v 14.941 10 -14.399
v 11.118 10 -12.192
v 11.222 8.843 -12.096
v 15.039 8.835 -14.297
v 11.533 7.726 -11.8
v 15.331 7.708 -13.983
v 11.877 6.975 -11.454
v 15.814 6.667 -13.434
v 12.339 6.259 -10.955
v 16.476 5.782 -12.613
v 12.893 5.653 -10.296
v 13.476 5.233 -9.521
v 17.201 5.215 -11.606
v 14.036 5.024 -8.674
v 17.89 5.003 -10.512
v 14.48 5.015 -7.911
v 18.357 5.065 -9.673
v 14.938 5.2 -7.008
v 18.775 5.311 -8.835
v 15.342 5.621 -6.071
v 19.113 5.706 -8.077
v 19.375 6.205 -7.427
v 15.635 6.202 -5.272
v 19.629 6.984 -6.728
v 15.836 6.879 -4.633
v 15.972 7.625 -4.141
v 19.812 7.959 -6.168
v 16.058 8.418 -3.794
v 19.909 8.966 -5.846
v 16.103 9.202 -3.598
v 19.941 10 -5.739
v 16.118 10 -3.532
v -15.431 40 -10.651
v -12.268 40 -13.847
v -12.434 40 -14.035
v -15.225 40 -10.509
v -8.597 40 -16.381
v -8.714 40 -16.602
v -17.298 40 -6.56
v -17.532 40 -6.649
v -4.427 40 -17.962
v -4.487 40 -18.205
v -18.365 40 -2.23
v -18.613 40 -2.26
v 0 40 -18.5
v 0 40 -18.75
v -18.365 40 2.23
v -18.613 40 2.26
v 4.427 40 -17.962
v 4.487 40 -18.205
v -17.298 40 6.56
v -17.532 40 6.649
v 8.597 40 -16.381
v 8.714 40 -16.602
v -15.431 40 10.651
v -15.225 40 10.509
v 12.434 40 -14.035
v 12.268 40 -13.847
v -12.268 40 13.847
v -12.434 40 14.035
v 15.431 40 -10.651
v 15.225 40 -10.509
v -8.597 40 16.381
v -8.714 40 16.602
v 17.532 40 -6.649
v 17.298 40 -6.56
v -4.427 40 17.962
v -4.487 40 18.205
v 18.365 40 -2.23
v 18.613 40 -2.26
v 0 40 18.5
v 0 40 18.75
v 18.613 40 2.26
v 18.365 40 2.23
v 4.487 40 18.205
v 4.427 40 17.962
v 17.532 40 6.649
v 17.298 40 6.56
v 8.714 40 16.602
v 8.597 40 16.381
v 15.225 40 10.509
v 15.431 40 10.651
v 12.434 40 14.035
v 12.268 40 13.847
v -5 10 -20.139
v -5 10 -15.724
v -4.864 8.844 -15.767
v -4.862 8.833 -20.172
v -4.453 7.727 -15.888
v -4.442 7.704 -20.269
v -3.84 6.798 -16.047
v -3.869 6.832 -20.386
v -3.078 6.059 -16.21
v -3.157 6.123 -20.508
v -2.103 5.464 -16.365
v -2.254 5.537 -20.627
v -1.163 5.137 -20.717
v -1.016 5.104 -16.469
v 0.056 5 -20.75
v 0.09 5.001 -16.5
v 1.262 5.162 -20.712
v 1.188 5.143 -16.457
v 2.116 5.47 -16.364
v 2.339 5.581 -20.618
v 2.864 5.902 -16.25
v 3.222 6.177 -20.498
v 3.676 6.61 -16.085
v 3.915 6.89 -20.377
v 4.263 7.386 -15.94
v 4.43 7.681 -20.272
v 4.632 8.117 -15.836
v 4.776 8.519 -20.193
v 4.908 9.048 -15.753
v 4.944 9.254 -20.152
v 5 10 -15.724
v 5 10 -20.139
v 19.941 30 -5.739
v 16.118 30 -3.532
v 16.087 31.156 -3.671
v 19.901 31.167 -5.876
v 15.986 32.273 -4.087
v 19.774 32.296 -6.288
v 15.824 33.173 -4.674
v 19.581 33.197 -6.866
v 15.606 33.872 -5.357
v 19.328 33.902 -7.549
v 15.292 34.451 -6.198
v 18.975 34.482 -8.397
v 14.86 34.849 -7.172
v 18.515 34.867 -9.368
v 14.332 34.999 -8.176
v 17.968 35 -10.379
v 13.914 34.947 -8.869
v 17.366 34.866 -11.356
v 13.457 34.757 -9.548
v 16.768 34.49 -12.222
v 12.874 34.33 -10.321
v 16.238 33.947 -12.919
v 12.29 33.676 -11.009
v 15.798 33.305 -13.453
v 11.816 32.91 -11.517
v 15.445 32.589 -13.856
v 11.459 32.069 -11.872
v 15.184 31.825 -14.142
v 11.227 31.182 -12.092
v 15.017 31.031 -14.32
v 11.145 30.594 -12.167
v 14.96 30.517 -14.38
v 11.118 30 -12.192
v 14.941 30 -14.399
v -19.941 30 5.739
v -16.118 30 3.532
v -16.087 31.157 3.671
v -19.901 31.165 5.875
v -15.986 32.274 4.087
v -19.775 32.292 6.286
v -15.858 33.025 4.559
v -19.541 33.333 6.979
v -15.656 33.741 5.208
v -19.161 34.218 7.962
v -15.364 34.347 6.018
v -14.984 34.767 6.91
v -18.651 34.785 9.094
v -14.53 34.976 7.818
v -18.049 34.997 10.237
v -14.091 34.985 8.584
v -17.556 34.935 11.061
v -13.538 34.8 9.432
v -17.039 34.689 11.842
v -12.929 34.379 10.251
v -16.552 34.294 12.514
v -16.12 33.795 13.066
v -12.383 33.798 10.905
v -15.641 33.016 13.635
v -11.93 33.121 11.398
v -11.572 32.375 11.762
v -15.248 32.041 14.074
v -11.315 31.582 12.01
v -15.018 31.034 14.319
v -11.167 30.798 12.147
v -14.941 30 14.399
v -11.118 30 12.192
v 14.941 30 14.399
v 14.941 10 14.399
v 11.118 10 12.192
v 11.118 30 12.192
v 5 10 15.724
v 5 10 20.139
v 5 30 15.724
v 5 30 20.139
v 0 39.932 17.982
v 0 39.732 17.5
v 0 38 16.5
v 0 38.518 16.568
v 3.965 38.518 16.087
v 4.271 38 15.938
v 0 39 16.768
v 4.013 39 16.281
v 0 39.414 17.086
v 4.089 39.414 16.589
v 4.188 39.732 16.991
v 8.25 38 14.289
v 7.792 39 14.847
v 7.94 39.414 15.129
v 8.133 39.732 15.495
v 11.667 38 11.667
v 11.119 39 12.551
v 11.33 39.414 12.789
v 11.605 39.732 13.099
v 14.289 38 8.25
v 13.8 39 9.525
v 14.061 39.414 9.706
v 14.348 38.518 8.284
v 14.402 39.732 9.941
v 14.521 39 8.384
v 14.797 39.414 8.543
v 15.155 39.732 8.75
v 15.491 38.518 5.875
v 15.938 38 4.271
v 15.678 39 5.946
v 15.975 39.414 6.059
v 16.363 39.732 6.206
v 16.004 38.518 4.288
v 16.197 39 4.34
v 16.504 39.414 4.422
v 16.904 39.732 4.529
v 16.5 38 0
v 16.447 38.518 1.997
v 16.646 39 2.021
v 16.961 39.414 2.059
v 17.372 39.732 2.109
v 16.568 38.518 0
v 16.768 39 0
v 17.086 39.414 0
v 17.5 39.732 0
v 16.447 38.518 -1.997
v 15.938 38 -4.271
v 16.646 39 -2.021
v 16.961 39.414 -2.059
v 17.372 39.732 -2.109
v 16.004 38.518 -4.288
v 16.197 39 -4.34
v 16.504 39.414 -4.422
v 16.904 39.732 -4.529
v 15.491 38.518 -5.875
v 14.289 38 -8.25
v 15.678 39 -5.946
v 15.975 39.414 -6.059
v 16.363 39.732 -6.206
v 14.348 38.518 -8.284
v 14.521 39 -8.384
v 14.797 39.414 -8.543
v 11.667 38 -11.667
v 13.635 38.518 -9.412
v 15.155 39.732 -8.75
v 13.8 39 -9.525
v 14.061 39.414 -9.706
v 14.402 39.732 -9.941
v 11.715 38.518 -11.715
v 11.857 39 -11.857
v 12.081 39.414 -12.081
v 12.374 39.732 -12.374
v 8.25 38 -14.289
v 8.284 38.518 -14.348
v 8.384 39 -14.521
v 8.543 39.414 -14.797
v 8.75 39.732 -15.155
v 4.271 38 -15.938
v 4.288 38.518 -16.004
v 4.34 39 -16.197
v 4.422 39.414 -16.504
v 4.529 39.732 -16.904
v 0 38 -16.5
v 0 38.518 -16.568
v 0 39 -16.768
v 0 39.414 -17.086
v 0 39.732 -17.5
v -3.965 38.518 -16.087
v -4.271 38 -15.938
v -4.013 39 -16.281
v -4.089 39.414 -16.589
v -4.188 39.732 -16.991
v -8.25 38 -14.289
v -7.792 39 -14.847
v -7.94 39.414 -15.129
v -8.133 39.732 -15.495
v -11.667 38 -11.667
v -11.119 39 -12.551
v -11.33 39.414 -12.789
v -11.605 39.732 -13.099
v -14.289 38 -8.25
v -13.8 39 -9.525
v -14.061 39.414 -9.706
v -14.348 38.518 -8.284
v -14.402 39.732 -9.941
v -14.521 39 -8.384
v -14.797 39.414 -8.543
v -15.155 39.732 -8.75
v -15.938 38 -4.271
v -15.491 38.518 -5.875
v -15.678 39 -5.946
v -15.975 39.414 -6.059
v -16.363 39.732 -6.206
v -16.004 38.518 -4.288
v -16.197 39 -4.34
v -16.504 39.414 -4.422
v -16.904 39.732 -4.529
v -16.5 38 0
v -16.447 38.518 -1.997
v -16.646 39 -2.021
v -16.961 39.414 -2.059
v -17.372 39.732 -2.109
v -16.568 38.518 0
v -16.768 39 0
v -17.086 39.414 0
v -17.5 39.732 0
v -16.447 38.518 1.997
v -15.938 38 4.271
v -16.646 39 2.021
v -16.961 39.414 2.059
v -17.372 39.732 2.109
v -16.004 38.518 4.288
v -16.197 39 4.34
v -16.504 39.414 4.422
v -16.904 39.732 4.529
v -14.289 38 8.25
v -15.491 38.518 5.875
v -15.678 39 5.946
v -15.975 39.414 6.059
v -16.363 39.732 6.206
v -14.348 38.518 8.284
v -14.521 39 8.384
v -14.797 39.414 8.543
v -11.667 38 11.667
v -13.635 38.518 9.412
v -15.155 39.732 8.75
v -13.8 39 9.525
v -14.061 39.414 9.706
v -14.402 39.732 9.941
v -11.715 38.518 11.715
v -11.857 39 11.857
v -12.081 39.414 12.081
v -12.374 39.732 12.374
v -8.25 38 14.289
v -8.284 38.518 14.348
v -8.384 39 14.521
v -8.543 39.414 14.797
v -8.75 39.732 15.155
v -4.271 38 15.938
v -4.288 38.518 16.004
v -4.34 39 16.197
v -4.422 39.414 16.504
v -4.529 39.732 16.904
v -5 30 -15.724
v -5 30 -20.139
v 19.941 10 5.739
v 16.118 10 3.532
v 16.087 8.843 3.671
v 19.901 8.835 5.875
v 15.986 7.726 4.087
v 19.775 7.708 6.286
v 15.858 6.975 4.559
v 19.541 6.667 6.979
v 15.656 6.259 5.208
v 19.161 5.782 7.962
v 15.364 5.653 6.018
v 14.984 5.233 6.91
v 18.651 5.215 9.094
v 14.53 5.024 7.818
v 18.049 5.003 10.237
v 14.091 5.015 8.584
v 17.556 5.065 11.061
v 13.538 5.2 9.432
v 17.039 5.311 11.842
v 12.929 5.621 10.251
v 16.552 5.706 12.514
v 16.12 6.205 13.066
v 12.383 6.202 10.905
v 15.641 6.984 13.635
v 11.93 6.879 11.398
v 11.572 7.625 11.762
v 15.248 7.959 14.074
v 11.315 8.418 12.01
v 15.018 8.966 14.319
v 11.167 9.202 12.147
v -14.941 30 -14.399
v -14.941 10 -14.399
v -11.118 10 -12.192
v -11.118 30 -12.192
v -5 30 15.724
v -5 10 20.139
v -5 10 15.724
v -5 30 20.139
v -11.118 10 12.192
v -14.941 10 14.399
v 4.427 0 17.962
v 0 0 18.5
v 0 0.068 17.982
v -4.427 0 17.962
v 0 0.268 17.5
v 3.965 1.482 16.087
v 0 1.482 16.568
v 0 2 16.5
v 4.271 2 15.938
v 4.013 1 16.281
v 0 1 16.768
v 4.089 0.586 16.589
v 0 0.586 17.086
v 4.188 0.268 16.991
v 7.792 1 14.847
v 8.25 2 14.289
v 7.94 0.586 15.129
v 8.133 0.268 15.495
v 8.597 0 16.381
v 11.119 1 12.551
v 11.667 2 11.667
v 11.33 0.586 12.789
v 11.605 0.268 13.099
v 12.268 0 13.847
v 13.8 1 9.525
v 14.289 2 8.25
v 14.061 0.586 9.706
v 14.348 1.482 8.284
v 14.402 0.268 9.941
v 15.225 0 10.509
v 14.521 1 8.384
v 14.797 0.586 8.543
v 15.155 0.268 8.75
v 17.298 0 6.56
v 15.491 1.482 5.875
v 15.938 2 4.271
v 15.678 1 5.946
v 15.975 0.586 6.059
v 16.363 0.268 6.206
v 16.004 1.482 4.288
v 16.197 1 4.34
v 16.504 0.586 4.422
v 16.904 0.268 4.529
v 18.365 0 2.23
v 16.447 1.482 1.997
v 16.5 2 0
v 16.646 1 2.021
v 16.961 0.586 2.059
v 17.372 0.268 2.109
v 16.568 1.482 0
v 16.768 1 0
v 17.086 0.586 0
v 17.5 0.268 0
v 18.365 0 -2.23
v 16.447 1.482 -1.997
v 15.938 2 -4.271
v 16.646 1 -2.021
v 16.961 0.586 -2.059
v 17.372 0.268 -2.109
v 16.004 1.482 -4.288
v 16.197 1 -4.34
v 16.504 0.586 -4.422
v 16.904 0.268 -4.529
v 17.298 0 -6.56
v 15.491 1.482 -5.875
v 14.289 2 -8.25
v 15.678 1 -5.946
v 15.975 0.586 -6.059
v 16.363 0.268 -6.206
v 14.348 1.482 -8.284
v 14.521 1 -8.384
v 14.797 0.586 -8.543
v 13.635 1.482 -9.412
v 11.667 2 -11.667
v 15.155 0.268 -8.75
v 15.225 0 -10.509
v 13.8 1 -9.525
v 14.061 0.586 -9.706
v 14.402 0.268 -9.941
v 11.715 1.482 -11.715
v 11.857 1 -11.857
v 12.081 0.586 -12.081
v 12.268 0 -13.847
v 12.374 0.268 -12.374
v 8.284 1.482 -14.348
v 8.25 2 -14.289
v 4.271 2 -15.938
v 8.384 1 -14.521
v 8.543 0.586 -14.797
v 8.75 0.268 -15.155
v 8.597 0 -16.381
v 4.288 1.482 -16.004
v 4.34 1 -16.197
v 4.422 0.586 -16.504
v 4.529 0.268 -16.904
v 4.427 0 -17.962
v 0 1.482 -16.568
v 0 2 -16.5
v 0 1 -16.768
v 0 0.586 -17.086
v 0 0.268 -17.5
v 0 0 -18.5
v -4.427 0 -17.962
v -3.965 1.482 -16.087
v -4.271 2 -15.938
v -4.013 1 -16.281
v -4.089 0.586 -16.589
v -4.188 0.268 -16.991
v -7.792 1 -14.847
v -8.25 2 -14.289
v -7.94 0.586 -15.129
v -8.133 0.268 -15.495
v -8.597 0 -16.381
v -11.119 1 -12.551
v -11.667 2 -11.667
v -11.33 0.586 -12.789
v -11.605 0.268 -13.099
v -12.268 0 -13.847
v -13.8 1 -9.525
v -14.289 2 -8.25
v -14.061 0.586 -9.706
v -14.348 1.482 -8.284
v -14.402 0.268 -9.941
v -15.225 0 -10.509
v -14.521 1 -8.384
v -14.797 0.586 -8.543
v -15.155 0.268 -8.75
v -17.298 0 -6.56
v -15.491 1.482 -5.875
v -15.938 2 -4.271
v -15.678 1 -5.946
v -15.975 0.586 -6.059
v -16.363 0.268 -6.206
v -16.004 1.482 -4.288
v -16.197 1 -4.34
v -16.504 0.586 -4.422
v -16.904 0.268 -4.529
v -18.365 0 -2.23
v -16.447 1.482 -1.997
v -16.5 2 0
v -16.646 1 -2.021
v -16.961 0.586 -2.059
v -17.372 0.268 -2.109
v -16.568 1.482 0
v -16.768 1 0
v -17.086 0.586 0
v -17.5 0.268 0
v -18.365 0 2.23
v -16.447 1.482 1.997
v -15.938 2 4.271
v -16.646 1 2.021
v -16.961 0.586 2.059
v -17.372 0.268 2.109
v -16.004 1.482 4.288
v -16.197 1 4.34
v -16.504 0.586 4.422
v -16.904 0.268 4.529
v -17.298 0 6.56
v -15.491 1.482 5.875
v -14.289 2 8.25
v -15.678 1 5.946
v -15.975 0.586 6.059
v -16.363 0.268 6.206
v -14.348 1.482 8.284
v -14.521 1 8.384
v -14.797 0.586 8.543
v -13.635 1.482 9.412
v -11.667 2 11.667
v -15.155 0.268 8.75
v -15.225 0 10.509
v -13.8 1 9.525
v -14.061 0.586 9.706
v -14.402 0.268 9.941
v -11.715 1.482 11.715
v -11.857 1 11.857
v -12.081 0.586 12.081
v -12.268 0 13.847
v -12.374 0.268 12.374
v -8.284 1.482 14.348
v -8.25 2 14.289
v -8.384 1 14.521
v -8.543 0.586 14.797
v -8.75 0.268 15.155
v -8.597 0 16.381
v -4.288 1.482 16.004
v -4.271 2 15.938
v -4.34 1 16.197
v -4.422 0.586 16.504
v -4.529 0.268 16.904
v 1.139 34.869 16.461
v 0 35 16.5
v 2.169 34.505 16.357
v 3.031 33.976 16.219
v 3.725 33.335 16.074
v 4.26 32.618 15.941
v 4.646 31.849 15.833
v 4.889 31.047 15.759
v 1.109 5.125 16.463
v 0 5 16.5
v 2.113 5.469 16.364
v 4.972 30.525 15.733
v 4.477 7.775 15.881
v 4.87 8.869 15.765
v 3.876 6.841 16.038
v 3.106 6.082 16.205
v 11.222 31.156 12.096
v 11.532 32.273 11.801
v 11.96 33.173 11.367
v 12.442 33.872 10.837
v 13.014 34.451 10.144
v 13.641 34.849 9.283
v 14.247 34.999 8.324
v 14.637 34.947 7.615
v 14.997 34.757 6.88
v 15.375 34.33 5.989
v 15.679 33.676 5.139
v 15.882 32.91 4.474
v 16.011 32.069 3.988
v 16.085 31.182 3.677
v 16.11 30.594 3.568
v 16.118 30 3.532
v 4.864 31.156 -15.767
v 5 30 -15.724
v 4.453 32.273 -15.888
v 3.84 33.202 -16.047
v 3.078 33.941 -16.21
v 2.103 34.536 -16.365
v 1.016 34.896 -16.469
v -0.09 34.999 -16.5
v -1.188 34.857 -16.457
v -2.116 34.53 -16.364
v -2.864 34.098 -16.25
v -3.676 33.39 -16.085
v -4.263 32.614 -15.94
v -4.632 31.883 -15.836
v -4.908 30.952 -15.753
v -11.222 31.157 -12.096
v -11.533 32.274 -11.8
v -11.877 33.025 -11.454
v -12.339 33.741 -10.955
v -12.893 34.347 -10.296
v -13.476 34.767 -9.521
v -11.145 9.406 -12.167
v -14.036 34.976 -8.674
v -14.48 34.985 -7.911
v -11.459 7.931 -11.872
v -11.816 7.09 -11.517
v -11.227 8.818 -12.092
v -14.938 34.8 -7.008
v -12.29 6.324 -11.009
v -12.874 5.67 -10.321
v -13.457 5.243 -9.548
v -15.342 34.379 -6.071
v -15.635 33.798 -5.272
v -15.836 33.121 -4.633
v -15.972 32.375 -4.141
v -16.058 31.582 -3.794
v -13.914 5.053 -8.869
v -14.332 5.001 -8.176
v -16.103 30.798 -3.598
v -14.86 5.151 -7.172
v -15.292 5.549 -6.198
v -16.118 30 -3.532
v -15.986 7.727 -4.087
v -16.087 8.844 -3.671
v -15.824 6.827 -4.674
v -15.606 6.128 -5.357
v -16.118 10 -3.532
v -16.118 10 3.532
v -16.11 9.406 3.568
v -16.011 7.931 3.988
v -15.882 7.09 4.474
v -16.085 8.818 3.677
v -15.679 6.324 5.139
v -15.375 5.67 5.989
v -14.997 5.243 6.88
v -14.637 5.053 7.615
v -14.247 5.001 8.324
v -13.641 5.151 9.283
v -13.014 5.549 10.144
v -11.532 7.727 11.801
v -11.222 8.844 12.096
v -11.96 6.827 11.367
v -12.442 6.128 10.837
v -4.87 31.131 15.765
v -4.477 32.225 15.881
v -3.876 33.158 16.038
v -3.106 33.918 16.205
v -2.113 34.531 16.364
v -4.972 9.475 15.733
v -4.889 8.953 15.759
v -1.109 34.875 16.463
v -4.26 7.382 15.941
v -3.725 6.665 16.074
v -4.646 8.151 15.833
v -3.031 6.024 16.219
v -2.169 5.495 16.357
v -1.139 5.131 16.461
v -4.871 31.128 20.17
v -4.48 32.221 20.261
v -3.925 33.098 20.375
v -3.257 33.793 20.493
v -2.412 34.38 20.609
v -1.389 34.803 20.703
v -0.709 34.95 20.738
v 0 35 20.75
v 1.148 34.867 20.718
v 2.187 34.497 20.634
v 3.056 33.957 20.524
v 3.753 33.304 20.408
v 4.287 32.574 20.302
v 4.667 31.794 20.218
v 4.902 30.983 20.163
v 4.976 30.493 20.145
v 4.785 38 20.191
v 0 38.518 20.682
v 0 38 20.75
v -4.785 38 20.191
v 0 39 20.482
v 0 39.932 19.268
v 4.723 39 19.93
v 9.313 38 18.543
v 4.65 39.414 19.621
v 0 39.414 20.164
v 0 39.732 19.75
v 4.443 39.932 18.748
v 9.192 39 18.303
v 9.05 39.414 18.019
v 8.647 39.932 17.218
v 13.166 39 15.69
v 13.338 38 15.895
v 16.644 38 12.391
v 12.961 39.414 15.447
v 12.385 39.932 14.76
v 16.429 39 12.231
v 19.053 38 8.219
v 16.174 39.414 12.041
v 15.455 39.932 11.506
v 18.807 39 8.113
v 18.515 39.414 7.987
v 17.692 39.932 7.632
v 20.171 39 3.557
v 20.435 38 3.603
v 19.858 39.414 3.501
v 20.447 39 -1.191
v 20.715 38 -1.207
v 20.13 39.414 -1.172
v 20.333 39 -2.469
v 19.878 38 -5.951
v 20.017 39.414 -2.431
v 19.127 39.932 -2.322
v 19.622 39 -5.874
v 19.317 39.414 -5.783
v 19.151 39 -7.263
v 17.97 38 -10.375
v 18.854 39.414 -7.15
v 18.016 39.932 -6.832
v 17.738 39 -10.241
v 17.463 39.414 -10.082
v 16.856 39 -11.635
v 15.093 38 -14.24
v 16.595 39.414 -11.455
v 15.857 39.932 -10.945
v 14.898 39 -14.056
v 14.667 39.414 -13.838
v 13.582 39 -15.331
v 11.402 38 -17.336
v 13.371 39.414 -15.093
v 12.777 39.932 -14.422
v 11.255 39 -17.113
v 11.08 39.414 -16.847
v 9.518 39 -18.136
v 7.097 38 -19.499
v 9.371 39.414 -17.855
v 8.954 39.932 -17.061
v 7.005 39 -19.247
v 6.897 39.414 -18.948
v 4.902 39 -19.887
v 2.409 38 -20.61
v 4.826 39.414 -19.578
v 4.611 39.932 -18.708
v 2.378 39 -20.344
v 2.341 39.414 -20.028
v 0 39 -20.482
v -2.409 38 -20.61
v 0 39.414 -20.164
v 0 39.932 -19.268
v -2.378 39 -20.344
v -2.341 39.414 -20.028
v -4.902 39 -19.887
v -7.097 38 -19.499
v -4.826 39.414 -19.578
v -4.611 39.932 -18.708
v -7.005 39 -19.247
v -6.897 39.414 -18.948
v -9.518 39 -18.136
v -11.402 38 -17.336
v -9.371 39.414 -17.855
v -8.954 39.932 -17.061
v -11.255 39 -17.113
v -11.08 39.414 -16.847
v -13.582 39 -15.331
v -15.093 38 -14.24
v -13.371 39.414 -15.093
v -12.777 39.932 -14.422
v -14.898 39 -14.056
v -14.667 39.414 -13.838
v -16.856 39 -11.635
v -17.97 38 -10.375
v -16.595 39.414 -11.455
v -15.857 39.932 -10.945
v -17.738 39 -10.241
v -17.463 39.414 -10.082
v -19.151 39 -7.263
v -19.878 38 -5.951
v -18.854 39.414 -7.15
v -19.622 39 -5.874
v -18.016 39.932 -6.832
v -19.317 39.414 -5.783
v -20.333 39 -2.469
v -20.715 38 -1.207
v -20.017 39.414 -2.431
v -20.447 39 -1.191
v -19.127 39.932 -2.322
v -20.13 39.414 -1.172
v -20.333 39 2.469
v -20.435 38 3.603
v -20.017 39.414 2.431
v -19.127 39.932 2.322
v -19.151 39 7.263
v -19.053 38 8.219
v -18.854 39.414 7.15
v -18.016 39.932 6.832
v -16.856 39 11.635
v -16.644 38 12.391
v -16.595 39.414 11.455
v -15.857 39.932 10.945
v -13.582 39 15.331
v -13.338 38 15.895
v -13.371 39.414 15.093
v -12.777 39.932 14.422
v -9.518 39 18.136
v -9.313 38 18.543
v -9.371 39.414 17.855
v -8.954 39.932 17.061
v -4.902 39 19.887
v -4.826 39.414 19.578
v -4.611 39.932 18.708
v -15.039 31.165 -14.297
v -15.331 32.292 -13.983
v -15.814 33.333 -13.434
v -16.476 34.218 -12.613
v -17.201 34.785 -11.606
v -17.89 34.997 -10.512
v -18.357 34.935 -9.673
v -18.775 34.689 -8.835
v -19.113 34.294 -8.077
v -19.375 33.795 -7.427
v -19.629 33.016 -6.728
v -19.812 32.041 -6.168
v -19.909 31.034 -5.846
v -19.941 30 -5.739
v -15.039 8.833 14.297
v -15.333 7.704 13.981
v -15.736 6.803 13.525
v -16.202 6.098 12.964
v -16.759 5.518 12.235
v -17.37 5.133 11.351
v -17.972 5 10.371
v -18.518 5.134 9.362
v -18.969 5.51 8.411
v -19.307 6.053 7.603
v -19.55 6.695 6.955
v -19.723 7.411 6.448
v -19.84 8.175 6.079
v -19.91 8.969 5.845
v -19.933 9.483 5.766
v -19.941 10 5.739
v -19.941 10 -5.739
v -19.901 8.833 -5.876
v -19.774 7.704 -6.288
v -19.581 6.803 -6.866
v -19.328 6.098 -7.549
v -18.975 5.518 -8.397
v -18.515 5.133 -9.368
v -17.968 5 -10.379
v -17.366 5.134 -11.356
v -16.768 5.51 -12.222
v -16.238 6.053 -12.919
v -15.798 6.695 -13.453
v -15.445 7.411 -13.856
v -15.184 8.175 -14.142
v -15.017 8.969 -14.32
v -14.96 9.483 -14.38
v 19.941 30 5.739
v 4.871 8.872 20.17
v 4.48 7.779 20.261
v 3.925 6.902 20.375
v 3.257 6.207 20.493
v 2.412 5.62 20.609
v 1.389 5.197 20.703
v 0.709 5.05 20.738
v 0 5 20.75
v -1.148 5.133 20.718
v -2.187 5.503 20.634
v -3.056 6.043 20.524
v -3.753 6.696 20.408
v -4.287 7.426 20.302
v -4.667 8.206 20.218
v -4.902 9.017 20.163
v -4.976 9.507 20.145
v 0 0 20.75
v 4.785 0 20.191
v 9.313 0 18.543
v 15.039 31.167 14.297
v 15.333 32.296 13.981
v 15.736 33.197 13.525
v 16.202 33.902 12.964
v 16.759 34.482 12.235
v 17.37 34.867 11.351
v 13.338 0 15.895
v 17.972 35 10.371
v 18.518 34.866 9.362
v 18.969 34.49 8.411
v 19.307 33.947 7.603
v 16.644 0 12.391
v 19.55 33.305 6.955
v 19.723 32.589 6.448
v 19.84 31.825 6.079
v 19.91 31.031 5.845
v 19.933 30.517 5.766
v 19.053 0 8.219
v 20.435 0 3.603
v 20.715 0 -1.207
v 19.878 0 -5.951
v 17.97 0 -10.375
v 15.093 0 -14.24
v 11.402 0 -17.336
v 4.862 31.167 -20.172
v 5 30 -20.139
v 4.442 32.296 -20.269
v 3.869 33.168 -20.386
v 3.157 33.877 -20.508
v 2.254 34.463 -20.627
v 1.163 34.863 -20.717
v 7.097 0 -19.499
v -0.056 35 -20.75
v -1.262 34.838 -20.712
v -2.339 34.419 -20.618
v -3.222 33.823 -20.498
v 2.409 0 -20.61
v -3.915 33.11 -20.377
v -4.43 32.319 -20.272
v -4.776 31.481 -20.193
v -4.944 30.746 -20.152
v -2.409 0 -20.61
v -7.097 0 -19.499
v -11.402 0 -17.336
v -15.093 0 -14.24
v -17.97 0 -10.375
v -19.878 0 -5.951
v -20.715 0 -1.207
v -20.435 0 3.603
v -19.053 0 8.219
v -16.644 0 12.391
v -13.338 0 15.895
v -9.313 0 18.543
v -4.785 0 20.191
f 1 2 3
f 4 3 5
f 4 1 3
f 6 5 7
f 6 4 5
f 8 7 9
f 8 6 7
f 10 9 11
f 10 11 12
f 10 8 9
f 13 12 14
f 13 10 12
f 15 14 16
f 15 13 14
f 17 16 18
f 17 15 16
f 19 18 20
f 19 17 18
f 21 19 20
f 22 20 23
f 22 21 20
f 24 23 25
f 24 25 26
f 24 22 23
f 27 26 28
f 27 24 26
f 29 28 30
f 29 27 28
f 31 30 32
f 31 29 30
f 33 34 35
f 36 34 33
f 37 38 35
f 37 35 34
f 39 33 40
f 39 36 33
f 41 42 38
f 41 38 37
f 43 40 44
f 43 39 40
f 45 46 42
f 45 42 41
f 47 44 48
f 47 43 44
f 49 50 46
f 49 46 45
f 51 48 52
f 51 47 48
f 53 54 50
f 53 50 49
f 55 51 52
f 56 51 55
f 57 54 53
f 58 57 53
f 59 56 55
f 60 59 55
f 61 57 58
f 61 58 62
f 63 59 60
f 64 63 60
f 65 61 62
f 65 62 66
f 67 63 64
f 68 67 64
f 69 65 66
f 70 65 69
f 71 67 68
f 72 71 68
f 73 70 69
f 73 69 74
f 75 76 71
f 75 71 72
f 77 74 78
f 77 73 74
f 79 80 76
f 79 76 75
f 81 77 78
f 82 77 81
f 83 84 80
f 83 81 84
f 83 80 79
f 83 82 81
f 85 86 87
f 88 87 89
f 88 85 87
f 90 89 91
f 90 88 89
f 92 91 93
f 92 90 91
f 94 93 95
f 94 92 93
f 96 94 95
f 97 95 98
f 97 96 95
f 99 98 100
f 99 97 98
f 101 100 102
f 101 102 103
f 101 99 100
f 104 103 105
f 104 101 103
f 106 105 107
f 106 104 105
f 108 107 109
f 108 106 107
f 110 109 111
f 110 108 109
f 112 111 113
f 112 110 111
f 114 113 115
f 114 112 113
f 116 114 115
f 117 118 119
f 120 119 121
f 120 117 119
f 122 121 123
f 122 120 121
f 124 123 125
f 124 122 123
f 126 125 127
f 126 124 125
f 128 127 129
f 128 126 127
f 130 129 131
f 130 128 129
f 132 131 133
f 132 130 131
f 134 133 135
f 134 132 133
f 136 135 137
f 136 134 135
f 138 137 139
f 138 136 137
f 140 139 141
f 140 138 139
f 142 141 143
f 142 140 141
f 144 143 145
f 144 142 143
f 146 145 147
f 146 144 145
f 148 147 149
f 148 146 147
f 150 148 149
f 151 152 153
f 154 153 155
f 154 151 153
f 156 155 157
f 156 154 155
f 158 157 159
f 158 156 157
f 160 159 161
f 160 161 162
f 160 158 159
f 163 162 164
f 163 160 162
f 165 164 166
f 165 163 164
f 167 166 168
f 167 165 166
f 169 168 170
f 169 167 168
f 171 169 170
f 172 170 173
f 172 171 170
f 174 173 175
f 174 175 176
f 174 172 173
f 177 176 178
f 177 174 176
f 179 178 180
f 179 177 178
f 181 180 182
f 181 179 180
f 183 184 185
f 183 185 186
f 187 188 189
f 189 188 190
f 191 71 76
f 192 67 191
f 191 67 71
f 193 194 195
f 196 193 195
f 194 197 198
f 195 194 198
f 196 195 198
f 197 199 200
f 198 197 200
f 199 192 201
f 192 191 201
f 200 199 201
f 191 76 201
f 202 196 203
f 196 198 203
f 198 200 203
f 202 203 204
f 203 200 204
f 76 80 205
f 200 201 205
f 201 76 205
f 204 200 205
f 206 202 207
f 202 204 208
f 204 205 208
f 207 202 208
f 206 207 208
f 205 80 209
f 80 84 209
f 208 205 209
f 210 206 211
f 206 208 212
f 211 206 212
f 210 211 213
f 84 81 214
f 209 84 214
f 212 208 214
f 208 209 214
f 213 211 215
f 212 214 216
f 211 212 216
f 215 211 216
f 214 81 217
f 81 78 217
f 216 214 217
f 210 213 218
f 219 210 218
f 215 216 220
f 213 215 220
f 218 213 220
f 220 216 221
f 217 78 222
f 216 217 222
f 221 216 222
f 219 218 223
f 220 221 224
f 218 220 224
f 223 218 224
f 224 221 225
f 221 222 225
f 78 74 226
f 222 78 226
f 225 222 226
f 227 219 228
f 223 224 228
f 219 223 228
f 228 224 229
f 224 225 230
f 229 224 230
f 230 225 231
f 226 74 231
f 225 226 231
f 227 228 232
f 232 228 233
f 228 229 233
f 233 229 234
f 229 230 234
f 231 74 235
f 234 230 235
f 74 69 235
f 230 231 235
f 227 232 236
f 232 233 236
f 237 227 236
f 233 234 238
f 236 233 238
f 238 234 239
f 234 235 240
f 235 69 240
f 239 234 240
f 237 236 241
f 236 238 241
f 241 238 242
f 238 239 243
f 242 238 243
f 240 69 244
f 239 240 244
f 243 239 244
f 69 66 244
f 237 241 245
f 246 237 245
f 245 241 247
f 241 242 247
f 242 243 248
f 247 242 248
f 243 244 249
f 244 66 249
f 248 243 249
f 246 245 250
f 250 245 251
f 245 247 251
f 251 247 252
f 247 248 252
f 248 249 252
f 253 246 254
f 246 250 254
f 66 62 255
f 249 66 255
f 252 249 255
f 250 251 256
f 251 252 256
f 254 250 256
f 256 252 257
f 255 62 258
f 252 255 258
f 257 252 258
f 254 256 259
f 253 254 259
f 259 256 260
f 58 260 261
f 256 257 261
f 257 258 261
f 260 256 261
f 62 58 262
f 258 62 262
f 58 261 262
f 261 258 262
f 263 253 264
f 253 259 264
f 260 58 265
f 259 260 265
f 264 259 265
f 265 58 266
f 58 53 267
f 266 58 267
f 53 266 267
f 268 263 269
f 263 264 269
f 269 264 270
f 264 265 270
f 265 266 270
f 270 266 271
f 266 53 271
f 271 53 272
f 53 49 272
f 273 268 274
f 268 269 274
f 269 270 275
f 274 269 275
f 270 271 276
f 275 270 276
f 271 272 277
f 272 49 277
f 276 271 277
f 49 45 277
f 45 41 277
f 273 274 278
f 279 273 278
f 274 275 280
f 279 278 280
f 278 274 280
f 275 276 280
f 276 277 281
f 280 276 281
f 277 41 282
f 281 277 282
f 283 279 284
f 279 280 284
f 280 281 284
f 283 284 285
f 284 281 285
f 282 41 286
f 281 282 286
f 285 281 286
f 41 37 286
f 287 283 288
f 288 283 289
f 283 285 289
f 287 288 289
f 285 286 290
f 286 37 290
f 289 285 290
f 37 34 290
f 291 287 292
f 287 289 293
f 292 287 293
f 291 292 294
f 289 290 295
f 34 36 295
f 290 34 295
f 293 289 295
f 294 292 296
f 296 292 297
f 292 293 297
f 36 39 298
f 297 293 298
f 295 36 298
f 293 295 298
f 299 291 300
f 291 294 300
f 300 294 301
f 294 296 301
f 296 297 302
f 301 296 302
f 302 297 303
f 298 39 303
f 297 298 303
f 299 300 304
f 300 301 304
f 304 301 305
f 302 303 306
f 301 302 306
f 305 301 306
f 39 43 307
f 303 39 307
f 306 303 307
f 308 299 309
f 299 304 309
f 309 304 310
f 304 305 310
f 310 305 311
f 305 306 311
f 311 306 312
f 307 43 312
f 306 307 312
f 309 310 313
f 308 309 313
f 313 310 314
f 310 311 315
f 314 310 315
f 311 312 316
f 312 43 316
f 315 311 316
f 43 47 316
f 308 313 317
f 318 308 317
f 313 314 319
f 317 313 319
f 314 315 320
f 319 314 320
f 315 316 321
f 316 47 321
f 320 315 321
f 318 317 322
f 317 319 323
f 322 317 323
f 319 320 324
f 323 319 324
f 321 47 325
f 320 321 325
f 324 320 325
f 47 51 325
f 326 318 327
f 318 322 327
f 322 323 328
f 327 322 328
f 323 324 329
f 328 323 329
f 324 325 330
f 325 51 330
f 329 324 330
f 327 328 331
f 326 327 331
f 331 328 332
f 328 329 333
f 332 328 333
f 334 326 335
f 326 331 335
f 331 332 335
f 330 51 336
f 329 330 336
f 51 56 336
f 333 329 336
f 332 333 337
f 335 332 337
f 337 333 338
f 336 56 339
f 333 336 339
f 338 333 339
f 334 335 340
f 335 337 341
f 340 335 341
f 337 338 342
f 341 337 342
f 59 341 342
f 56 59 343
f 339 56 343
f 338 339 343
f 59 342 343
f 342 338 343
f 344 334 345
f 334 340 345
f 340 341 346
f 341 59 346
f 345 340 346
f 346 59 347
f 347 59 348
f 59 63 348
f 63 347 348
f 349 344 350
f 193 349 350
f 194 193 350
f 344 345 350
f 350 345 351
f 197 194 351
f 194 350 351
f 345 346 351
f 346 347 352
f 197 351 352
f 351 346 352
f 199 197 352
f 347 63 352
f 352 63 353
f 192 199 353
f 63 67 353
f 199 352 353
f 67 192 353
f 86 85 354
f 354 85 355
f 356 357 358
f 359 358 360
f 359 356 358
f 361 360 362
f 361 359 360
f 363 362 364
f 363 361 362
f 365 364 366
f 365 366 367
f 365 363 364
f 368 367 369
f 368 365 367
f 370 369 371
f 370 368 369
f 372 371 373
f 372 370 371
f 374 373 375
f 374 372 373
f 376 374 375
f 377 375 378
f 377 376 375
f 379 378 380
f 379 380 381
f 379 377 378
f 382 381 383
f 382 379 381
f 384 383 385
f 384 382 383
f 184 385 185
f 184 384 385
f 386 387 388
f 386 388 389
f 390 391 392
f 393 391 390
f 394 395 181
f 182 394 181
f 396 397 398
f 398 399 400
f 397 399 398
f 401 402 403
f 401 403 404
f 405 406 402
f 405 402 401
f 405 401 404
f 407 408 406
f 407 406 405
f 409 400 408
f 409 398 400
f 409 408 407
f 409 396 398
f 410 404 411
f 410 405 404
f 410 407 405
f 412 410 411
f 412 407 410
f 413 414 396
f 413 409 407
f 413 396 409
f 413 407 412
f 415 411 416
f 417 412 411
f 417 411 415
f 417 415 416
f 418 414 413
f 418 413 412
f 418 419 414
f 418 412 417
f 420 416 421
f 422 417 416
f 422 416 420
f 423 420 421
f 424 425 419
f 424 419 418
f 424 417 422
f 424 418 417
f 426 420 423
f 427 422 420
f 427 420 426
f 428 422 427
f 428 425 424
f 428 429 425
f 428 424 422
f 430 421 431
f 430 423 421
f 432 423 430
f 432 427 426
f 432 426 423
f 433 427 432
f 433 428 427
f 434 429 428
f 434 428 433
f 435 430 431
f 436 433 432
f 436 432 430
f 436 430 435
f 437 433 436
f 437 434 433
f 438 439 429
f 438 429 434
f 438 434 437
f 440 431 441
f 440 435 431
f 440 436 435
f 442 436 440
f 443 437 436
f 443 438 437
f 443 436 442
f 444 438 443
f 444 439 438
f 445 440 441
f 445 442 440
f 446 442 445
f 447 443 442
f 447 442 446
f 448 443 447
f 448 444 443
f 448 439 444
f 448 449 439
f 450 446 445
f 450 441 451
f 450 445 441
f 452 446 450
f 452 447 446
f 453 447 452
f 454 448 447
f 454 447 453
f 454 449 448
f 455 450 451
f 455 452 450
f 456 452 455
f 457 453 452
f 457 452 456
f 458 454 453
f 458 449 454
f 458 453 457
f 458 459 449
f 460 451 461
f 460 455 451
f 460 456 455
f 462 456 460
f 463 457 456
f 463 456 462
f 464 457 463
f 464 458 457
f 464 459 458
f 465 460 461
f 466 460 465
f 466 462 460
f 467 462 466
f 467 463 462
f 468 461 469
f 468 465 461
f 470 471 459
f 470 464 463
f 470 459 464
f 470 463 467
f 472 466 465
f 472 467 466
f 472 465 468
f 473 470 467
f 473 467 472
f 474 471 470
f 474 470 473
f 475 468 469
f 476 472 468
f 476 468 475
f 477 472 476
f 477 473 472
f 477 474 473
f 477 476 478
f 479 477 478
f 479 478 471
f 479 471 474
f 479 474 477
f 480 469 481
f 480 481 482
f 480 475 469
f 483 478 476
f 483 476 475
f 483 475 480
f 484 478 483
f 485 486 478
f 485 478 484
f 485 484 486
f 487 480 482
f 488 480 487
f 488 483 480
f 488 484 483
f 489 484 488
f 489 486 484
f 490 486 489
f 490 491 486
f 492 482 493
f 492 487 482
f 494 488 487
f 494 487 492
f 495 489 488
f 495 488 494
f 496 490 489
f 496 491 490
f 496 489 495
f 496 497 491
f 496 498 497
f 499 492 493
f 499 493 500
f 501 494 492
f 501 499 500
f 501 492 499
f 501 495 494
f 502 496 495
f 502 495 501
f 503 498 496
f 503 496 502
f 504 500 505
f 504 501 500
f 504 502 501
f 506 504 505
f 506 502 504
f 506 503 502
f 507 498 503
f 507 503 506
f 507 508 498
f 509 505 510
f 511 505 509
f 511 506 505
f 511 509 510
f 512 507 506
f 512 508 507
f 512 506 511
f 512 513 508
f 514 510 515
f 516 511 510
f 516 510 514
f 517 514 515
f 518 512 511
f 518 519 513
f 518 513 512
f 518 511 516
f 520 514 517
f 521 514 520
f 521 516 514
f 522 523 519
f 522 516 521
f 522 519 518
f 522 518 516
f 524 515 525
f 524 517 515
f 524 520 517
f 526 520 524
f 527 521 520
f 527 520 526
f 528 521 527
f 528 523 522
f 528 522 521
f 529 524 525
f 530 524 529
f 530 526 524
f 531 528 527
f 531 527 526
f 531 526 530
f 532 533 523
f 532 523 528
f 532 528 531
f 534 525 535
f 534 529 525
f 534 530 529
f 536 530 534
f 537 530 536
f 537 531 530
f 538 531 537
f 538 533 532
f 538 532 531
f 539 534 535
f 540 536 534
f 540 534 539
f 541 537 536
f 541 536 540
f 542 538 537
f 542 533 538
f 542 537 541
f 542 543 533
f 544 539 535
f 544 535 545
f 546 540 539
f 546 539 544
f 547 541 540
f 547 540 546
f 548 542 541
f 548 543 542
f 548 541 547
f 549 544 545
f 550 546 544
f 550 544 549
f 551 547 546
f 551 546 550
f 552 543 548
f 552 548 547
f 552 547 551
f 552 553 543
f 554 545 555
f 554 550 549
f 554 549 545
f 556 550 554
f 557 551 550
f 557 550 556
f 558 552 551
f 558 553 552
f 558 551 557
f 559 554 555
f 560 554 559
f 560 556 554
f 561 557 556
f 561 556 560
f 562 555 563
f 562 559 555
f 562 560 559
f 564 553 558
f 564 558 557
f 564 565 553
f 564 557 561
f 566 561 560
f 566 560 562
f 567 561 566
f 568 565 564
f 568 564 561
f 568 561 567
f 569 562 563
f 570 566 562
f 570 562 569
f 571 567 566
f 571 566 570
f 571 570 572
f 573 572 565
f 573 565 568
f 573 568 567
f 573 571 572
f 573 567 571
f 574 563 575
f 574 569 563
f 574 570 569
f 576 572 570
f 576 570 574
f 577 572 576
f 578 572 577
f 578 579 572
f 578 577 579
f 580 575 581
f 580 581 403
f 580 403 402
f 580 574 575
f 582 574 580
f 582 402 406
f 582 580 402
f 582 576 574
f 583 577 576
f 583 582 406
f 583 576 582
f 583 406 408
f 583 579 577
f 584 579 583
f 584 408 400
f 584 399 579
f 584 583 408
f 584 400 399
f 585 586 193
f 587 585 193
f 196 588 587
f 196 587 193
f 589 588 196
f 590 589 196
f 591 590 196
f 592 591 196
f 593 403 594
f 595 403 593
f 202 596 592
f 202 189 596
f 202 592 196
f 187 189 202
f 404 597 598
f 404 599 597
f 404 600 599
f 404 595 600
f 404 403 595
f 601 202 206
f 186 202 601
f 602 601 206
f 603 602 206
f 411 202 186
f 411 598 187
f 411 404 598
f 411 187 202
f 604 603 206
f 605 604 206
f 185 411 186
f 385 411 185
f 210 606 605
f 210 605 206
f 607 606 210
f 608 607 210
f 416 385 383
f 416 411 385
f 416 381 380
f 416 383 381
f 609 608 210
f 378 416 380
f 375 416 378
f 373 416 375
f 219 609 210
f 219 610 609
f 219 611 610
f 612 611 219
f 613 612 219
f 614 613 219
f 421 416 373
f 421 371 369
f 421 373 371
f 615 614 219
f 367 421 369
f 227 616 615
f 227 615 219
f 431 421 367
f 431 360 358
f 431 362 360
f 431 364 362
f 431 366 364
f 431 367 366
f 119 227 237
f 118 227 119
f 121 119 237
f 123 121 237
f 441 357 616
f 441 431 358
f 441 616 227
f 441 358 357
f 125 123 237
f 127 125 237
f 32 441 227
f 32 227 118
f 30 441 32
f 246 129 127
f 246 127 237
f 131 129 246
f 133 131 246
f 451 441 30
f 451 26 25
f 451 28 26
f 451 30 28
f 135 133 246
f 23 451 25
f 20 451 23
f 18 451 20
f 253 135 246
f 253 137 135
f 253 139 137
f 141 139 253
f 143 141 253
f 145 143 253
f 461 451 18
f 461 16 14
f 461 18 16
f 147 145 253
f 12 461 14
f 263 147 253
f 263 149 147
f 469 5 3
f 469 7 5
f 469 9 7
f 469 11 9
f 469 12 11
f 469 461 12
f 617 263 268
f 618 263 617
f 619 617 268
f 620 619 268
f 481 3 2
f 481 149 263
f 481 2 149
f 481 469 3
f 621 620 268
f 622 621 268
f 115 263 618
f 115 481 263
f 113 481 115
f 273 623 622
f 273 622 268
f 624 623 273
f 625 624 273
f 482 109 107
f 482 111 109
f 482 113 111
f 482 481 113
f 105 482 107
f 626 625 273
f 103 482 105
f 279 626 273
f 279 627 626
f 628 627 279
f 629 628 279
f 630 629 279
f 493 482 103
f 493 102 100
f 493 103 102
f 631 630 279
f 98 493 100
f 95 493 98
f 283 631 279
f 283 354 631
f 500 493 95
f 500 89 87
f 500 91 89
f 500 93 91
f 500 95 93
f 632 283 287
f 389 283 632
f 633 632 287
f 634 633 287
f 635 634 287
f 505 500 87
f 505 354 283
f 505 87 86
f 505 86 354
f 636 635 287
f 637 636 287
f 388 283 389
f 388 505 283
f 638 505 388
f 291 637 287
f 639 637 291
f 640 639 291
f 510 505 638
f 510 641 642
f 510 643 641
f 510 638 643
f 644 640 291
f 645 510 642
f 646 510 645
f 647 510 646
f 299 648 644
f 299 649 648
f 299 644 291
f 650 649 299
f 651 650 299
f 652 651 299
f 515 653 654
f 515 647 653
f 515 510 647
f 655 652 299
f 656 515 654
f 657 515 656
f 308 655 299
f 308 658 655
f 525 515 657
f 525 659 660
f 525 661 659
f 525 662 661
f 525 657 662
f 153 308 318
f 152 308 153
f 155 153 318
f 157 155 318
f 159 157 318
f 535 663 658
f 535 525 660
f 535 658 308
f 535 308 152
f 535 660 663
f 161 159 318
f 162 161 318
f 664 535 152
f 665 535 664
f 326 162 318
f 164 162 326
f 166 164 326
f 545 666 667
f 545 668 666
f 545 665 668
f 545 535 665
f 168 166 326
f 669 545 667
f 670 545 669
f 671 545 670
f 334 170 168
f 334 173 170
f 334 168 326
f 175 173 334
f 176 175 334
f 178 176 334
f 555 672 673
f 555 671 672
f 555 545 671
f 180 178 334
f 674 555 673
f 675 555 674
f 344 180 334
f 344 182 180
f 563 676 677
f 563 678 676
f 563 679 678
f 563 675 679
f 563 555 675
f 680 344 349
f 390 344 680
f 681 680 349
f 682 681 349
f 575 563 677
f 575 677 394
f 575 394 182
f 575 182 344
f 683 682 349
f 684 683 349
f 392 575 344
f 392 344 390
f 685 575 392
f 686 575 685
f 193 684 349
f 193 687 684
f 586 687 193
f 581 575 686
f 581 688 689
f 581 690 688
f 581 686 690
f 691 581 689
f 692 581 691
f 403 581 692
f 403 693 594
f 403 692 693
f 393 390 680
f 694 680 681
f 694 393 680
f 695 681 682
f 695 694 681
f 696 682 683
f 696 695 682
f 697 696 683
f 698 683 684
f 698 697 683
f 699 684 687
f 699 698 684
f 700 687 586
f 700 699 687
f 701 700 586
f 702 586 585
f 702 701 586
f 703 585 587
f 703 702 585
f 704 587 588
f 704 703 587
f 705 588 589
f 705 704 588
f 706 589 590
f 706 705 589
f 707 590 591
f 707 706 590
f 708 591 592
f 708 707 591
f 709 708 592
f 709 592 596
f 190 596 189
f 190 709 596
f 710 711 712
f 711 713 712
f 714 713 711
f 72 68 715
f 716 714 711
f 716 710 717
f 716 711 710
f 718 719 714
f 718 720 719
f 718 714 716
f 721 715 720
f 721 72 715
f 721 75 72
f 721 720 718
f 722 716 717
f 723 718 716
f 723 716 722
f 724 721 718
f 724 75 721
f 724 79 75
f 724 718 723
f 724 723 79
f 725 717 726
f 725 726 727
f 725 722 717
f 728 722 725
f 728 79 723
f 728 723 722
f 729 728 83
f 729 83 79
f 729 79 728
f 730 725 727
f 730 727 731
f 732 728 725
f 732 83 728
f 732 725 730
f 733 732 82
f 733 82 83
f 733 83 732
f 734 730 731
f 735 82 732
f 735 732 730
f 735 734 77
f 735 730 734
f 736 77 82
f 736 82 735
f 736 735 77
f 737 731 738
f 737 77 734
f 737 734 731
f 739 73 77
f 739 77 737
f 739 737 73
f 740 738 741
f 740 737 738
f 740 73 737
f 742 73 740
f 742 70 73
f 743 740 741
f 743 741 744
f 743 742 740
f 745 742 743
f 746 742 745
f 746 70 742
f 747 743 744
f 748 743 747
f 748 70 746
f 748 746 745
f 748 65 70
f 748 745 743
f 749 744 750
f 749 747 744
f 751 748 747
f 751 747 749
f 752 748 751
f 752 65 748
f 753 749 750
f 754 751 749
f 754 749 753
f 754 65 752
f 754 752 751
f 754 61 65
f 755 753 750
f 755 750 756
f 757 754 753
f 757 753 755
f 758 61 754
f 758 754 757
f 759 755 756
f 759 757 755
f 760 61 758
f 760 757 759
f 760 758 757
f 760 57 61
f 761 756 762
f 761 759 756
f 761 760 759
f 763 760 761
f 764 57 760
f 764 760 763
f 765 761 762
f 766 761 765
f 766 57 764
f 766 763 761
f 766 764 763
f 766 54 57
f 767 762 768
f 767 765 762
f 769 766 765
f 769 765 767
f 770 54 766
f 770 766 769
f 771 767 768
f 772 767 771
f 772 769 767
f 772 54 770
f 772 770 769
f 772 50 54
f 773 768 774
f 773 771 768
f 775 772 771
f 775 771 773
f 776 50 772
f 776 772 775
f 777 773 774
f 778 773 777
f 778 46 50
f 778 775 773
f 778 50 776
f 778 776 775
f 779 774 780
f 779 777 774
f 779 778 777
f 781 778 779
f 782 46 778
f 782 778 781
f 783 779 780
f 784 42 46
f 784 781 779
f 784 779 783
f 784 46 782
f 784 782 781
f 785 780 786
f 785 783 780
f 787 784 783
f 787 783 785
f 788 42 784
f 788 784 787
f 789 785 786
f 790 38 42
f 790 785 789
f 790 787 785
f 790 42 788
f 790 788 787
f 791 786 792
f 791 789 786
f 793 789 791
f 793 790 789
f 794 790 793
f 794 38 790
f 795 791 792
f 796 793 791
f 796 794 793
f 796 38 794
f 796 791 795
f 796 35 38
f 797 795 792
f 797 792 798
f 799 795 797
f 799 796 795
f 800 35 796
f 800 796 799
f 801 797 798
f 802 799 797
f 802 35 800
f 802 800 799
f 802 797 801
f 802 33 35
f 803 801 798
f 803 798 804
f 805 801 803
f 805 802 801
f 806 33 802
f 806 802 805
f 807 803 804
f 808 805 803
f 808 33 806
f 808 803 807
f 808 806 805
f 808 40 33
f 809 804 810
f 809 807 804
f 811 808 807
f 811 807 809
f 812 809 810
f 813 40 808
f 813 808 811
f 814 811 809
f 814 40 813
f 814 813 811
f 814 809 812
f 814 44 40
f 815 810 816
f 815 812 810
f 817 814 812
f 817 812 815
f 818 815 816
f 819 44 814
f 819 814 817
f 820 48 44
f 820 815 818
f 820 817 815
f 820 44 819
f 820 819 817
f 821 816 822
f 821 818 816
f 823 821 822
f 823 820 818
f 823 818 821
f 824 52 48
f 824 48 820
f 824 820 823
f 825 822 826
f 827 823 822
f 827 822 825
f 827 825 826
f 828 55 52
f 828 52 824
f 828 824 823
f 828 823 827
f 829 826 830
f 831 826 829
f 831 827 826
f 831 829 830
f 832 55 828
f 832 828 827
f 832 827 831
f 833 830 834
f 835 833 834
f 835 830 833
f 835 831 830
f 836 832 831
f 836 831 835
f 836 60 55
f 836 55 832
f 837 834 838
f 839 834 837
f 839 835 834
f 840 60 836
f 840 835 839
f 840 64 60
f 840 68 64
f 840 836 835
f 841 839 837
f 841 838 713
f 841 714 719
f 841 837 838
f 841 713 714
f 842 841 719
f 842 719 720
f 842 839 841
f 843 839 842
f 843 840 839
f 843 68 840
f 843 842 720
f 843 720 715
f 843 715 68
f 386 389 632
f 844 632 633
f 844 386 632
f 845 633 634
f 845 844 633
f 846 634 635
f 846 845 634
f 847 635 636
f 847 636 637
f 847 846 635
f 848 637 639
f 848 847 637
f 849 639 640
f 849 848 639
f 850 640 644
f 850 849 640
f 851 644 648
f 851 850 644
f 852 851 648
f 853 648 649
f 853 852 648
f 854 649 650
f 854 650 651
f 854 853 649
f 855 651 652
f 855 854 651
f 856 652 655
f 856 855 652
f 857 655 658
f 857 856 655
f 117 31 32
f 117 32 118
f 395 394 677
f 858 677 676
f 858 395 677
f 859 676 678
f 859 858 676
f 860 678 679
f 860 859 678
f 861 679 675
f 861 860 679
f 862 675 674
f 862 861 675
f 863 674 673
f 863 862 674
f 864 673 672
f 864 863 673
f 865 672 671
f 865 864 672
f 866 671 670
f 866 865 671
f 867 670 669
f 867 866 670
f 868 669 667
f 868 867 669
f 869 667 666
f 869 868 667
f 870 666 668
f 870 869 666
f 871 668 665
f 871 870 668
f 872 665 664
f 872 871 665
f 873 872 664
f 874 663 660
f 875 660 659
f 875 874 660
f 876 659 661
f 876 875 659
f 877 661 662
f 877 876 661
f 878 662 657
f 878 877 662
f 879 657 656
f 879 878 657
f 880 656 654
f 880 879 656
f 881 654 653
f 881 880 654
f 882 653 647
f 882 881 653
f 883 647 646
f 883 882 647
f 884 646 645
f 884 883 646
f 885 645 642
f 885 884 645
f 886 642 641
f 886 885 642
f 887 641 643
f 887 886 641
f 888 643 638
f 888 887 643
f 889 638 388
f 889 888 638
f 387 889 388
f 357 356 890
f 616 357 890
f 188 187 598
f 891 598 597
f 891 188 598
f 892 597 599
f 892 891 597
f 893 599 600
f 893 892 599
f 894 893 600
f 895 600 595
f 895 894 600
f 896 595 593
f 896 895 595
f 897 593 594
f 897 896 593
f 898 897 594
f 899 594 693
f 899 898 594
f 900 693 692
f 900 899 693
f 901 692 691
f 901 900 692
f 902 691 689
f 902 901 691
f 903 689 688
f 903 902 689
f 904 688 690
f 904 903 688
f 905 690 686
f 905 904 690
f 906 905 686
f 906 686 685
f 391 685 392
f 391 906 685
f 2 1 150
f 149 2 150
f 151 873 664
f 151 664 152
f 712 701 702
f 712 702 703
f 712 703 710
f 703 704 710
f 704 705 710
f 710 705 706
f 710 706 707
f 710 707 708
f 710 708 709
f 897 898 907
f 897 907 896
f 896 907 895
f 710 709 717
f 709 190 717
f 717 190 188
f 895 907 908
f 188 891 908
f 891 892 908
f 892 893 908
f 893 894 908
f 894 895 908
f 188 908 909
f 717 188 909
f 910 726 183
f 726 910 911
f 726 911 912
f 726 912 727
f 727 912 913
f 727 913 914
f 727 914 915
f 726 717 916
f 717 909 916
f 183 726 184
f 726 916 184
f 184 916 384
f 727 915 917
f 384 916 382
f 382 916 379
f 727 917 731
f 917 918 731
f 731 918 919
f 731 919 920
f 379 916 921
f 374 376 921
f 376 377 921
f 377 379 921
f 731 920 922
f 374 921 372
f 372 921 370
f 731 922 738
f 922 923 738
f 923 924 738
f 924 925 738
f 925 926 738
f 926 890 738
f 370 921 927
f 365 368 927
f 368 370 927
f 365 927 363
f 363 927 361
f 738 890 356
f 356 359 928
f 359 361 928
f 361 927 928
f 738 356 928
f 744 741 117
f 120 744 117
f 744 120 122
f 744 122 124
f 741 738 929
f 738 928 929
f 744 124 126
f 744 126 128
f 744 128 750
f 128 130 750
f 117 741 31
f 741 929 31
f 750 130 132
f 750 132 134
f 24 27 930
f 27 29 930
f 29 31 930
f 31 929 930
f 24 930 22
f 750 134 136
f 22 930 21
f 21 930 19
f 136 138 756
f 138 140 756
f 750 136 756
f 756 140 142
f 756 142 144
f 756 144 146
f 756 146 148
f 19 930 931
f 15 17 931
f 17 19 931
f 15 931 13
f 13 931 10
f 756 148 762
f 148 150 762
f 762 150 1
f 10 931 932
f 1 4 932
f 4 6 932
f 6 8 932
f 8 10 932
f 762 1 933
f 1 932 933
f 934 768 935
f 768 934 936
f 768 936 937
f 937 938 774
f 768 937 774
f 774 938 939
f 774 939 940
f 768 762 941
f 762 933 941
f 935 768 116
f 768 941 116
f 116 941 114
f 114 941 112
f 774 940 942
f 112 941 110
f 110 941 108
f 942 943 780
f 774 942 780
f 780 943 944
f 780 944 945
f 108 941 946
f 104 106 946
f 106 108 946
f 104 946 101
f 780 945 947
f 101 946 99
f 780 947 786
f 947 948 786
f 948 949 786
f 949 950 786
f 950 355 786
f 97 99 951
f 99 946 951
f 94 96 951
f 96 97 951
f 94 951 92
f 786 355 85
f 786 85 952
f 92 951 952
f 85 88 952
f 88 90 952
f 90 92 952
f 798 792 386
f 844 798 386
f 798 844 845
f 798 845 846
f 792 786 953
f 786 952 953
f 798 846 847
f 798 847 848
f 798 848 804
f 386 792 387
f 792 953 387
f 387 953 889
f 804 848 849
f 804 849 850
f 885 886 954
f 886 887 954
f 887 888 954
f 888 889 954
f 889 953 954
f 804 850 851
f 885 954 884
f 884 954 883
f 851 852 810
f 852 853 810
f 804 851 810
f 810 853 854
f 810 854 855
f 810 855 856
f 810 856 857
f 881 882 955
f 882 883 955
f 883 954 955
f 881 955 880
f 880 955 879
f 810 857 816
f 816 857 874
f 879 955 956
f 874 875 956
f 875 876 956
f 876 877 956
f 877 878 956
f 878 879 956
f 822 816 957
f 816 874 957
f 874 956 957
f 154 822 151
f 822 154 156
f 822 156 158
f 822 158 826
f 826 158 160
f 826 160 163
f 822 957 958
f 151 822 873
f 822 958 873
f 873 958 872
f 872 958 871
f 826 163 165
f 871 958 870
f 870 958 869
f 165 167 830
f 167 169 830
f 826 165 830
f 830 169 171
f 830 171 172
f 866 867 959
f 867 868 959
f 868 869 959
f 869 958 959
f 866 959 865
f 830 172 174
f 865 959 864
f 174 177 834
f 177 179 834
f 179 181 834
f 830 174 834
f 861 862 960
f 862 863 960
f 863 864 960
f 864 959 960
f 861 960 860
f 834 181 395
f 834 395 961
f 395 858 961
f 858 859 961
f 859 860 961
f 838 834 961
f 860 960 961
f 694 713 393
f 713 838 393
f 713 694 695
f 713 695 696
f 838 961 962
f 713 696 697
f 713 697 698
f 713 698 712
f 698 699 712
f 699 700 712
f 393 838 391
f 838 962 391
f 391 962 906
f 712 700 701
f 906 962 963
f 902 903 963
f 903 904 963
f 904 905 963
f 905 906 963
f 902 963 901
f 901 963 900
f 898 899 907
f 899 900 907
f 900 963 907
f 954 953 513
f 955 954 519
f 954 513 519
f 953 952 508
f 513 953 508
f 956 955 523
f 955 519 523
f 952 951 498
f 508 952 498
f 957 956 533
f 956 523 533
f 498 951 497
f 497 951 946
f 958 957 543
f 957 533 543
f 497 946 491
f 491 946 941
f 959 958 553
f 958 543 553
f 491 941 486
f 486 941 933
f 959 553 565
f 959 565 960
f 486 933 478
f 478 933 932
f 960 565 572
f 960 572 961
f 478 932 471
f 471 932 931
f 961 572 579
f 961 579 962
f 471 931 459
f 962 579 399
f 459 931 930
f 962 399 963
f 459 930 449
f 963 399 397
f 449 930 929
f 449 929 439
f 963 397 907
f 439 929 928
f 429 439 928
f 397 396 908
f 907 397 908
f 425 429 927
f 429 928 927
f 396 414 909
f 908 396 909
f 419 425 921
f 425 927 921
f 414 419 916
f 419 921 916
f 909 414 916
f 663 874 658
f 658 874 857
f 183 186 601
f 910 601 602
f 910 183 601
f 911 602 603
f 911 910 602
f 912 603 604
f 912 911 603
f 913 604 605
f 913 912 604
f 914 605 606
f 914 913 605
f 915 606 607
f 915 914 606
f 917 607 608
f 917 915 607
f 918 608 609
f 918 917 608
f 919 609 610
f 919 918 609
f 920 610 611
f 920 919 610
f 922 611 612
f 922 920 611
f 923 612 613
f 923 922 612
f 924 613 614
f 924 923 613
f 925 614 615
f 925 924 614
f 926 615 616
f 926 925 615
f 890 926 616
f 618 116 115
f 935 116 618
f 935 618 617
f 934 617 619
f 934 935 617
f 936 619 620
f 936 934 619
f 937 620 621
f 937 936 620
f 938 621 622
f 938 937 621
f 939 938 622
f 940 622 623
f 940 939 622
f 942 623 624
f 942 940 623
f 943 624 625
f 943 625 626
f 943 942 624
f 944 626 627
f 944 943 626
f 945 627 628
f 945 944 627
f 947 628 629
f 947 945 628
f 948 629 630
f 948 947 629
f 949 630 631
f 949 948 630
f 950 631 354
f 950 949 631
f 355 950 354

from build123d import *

# Parameters (mm, degrees)
SKETCH1_R           = 20.75
SKETCH1_R_2         = 16.5
BOSS_EXTRUDE1_DEPTH = 40
CUT_EXTRUDE1_DEPTH  = 20
CIRPATTERN1_COUNT   = 6
FILLET1_R           = 2


with BuildPart() as part:
    # Sketch1 → Boss-Extrude1 (new body)
    with BuildSketch(Plane(origin=(0, 0, 0), x_dir=(1, 0, 0), z_dir=(0, 1, 0))):
        Circle(SKETCH1_R)
        Circle(SKETCH1_R_2, mode=Mode.SUBTRACT)
    extrude(amount=BOSS_EXTRUDE1_DEPTH)

    # Sketch2 → Cut-Extrude1 (cut)
    with BuildSketch(Plane.XY.offset(20.75)):
        with BuildLine():
            ThreePointArc((5, 30), (0, 35), (-5, 30))
            Line((-5, 30), (-5, 10))
            ThreePointArc((-5, 10), (0, 5), (5, 10))
            Line((5, 10), (5, 30))
        make_face()
    cut_extrude1 = extrude(amount=-CUT_EXTRUDE1_DEPTH, mode=Mode.SUBTRACT)

    # CirPattern1: Cut-Extrude1 ×6 about axis
    cirpattern1_axis = Axis((0, 40, 0), (0, -1, 0))
    for i in range(1, CIRPATTERN1_COUNT):
        add(cut_extrude1.rotate(cirpattern1_axis, i * 360 / CIRPATTERN1_COUNT), mode=Mode.SUBTRACT)

    # Fillet1
    fillet1_edges = [part.edges().sort_by_distance(p)[0] for p in [
        (-20.75, 40, 0),
        (-16.5, 0, 0),
        (-16.5, 40, 0),
    ]]
    fillet(fillet1_edges, radius=FILLET1_R)


solid = part.part
